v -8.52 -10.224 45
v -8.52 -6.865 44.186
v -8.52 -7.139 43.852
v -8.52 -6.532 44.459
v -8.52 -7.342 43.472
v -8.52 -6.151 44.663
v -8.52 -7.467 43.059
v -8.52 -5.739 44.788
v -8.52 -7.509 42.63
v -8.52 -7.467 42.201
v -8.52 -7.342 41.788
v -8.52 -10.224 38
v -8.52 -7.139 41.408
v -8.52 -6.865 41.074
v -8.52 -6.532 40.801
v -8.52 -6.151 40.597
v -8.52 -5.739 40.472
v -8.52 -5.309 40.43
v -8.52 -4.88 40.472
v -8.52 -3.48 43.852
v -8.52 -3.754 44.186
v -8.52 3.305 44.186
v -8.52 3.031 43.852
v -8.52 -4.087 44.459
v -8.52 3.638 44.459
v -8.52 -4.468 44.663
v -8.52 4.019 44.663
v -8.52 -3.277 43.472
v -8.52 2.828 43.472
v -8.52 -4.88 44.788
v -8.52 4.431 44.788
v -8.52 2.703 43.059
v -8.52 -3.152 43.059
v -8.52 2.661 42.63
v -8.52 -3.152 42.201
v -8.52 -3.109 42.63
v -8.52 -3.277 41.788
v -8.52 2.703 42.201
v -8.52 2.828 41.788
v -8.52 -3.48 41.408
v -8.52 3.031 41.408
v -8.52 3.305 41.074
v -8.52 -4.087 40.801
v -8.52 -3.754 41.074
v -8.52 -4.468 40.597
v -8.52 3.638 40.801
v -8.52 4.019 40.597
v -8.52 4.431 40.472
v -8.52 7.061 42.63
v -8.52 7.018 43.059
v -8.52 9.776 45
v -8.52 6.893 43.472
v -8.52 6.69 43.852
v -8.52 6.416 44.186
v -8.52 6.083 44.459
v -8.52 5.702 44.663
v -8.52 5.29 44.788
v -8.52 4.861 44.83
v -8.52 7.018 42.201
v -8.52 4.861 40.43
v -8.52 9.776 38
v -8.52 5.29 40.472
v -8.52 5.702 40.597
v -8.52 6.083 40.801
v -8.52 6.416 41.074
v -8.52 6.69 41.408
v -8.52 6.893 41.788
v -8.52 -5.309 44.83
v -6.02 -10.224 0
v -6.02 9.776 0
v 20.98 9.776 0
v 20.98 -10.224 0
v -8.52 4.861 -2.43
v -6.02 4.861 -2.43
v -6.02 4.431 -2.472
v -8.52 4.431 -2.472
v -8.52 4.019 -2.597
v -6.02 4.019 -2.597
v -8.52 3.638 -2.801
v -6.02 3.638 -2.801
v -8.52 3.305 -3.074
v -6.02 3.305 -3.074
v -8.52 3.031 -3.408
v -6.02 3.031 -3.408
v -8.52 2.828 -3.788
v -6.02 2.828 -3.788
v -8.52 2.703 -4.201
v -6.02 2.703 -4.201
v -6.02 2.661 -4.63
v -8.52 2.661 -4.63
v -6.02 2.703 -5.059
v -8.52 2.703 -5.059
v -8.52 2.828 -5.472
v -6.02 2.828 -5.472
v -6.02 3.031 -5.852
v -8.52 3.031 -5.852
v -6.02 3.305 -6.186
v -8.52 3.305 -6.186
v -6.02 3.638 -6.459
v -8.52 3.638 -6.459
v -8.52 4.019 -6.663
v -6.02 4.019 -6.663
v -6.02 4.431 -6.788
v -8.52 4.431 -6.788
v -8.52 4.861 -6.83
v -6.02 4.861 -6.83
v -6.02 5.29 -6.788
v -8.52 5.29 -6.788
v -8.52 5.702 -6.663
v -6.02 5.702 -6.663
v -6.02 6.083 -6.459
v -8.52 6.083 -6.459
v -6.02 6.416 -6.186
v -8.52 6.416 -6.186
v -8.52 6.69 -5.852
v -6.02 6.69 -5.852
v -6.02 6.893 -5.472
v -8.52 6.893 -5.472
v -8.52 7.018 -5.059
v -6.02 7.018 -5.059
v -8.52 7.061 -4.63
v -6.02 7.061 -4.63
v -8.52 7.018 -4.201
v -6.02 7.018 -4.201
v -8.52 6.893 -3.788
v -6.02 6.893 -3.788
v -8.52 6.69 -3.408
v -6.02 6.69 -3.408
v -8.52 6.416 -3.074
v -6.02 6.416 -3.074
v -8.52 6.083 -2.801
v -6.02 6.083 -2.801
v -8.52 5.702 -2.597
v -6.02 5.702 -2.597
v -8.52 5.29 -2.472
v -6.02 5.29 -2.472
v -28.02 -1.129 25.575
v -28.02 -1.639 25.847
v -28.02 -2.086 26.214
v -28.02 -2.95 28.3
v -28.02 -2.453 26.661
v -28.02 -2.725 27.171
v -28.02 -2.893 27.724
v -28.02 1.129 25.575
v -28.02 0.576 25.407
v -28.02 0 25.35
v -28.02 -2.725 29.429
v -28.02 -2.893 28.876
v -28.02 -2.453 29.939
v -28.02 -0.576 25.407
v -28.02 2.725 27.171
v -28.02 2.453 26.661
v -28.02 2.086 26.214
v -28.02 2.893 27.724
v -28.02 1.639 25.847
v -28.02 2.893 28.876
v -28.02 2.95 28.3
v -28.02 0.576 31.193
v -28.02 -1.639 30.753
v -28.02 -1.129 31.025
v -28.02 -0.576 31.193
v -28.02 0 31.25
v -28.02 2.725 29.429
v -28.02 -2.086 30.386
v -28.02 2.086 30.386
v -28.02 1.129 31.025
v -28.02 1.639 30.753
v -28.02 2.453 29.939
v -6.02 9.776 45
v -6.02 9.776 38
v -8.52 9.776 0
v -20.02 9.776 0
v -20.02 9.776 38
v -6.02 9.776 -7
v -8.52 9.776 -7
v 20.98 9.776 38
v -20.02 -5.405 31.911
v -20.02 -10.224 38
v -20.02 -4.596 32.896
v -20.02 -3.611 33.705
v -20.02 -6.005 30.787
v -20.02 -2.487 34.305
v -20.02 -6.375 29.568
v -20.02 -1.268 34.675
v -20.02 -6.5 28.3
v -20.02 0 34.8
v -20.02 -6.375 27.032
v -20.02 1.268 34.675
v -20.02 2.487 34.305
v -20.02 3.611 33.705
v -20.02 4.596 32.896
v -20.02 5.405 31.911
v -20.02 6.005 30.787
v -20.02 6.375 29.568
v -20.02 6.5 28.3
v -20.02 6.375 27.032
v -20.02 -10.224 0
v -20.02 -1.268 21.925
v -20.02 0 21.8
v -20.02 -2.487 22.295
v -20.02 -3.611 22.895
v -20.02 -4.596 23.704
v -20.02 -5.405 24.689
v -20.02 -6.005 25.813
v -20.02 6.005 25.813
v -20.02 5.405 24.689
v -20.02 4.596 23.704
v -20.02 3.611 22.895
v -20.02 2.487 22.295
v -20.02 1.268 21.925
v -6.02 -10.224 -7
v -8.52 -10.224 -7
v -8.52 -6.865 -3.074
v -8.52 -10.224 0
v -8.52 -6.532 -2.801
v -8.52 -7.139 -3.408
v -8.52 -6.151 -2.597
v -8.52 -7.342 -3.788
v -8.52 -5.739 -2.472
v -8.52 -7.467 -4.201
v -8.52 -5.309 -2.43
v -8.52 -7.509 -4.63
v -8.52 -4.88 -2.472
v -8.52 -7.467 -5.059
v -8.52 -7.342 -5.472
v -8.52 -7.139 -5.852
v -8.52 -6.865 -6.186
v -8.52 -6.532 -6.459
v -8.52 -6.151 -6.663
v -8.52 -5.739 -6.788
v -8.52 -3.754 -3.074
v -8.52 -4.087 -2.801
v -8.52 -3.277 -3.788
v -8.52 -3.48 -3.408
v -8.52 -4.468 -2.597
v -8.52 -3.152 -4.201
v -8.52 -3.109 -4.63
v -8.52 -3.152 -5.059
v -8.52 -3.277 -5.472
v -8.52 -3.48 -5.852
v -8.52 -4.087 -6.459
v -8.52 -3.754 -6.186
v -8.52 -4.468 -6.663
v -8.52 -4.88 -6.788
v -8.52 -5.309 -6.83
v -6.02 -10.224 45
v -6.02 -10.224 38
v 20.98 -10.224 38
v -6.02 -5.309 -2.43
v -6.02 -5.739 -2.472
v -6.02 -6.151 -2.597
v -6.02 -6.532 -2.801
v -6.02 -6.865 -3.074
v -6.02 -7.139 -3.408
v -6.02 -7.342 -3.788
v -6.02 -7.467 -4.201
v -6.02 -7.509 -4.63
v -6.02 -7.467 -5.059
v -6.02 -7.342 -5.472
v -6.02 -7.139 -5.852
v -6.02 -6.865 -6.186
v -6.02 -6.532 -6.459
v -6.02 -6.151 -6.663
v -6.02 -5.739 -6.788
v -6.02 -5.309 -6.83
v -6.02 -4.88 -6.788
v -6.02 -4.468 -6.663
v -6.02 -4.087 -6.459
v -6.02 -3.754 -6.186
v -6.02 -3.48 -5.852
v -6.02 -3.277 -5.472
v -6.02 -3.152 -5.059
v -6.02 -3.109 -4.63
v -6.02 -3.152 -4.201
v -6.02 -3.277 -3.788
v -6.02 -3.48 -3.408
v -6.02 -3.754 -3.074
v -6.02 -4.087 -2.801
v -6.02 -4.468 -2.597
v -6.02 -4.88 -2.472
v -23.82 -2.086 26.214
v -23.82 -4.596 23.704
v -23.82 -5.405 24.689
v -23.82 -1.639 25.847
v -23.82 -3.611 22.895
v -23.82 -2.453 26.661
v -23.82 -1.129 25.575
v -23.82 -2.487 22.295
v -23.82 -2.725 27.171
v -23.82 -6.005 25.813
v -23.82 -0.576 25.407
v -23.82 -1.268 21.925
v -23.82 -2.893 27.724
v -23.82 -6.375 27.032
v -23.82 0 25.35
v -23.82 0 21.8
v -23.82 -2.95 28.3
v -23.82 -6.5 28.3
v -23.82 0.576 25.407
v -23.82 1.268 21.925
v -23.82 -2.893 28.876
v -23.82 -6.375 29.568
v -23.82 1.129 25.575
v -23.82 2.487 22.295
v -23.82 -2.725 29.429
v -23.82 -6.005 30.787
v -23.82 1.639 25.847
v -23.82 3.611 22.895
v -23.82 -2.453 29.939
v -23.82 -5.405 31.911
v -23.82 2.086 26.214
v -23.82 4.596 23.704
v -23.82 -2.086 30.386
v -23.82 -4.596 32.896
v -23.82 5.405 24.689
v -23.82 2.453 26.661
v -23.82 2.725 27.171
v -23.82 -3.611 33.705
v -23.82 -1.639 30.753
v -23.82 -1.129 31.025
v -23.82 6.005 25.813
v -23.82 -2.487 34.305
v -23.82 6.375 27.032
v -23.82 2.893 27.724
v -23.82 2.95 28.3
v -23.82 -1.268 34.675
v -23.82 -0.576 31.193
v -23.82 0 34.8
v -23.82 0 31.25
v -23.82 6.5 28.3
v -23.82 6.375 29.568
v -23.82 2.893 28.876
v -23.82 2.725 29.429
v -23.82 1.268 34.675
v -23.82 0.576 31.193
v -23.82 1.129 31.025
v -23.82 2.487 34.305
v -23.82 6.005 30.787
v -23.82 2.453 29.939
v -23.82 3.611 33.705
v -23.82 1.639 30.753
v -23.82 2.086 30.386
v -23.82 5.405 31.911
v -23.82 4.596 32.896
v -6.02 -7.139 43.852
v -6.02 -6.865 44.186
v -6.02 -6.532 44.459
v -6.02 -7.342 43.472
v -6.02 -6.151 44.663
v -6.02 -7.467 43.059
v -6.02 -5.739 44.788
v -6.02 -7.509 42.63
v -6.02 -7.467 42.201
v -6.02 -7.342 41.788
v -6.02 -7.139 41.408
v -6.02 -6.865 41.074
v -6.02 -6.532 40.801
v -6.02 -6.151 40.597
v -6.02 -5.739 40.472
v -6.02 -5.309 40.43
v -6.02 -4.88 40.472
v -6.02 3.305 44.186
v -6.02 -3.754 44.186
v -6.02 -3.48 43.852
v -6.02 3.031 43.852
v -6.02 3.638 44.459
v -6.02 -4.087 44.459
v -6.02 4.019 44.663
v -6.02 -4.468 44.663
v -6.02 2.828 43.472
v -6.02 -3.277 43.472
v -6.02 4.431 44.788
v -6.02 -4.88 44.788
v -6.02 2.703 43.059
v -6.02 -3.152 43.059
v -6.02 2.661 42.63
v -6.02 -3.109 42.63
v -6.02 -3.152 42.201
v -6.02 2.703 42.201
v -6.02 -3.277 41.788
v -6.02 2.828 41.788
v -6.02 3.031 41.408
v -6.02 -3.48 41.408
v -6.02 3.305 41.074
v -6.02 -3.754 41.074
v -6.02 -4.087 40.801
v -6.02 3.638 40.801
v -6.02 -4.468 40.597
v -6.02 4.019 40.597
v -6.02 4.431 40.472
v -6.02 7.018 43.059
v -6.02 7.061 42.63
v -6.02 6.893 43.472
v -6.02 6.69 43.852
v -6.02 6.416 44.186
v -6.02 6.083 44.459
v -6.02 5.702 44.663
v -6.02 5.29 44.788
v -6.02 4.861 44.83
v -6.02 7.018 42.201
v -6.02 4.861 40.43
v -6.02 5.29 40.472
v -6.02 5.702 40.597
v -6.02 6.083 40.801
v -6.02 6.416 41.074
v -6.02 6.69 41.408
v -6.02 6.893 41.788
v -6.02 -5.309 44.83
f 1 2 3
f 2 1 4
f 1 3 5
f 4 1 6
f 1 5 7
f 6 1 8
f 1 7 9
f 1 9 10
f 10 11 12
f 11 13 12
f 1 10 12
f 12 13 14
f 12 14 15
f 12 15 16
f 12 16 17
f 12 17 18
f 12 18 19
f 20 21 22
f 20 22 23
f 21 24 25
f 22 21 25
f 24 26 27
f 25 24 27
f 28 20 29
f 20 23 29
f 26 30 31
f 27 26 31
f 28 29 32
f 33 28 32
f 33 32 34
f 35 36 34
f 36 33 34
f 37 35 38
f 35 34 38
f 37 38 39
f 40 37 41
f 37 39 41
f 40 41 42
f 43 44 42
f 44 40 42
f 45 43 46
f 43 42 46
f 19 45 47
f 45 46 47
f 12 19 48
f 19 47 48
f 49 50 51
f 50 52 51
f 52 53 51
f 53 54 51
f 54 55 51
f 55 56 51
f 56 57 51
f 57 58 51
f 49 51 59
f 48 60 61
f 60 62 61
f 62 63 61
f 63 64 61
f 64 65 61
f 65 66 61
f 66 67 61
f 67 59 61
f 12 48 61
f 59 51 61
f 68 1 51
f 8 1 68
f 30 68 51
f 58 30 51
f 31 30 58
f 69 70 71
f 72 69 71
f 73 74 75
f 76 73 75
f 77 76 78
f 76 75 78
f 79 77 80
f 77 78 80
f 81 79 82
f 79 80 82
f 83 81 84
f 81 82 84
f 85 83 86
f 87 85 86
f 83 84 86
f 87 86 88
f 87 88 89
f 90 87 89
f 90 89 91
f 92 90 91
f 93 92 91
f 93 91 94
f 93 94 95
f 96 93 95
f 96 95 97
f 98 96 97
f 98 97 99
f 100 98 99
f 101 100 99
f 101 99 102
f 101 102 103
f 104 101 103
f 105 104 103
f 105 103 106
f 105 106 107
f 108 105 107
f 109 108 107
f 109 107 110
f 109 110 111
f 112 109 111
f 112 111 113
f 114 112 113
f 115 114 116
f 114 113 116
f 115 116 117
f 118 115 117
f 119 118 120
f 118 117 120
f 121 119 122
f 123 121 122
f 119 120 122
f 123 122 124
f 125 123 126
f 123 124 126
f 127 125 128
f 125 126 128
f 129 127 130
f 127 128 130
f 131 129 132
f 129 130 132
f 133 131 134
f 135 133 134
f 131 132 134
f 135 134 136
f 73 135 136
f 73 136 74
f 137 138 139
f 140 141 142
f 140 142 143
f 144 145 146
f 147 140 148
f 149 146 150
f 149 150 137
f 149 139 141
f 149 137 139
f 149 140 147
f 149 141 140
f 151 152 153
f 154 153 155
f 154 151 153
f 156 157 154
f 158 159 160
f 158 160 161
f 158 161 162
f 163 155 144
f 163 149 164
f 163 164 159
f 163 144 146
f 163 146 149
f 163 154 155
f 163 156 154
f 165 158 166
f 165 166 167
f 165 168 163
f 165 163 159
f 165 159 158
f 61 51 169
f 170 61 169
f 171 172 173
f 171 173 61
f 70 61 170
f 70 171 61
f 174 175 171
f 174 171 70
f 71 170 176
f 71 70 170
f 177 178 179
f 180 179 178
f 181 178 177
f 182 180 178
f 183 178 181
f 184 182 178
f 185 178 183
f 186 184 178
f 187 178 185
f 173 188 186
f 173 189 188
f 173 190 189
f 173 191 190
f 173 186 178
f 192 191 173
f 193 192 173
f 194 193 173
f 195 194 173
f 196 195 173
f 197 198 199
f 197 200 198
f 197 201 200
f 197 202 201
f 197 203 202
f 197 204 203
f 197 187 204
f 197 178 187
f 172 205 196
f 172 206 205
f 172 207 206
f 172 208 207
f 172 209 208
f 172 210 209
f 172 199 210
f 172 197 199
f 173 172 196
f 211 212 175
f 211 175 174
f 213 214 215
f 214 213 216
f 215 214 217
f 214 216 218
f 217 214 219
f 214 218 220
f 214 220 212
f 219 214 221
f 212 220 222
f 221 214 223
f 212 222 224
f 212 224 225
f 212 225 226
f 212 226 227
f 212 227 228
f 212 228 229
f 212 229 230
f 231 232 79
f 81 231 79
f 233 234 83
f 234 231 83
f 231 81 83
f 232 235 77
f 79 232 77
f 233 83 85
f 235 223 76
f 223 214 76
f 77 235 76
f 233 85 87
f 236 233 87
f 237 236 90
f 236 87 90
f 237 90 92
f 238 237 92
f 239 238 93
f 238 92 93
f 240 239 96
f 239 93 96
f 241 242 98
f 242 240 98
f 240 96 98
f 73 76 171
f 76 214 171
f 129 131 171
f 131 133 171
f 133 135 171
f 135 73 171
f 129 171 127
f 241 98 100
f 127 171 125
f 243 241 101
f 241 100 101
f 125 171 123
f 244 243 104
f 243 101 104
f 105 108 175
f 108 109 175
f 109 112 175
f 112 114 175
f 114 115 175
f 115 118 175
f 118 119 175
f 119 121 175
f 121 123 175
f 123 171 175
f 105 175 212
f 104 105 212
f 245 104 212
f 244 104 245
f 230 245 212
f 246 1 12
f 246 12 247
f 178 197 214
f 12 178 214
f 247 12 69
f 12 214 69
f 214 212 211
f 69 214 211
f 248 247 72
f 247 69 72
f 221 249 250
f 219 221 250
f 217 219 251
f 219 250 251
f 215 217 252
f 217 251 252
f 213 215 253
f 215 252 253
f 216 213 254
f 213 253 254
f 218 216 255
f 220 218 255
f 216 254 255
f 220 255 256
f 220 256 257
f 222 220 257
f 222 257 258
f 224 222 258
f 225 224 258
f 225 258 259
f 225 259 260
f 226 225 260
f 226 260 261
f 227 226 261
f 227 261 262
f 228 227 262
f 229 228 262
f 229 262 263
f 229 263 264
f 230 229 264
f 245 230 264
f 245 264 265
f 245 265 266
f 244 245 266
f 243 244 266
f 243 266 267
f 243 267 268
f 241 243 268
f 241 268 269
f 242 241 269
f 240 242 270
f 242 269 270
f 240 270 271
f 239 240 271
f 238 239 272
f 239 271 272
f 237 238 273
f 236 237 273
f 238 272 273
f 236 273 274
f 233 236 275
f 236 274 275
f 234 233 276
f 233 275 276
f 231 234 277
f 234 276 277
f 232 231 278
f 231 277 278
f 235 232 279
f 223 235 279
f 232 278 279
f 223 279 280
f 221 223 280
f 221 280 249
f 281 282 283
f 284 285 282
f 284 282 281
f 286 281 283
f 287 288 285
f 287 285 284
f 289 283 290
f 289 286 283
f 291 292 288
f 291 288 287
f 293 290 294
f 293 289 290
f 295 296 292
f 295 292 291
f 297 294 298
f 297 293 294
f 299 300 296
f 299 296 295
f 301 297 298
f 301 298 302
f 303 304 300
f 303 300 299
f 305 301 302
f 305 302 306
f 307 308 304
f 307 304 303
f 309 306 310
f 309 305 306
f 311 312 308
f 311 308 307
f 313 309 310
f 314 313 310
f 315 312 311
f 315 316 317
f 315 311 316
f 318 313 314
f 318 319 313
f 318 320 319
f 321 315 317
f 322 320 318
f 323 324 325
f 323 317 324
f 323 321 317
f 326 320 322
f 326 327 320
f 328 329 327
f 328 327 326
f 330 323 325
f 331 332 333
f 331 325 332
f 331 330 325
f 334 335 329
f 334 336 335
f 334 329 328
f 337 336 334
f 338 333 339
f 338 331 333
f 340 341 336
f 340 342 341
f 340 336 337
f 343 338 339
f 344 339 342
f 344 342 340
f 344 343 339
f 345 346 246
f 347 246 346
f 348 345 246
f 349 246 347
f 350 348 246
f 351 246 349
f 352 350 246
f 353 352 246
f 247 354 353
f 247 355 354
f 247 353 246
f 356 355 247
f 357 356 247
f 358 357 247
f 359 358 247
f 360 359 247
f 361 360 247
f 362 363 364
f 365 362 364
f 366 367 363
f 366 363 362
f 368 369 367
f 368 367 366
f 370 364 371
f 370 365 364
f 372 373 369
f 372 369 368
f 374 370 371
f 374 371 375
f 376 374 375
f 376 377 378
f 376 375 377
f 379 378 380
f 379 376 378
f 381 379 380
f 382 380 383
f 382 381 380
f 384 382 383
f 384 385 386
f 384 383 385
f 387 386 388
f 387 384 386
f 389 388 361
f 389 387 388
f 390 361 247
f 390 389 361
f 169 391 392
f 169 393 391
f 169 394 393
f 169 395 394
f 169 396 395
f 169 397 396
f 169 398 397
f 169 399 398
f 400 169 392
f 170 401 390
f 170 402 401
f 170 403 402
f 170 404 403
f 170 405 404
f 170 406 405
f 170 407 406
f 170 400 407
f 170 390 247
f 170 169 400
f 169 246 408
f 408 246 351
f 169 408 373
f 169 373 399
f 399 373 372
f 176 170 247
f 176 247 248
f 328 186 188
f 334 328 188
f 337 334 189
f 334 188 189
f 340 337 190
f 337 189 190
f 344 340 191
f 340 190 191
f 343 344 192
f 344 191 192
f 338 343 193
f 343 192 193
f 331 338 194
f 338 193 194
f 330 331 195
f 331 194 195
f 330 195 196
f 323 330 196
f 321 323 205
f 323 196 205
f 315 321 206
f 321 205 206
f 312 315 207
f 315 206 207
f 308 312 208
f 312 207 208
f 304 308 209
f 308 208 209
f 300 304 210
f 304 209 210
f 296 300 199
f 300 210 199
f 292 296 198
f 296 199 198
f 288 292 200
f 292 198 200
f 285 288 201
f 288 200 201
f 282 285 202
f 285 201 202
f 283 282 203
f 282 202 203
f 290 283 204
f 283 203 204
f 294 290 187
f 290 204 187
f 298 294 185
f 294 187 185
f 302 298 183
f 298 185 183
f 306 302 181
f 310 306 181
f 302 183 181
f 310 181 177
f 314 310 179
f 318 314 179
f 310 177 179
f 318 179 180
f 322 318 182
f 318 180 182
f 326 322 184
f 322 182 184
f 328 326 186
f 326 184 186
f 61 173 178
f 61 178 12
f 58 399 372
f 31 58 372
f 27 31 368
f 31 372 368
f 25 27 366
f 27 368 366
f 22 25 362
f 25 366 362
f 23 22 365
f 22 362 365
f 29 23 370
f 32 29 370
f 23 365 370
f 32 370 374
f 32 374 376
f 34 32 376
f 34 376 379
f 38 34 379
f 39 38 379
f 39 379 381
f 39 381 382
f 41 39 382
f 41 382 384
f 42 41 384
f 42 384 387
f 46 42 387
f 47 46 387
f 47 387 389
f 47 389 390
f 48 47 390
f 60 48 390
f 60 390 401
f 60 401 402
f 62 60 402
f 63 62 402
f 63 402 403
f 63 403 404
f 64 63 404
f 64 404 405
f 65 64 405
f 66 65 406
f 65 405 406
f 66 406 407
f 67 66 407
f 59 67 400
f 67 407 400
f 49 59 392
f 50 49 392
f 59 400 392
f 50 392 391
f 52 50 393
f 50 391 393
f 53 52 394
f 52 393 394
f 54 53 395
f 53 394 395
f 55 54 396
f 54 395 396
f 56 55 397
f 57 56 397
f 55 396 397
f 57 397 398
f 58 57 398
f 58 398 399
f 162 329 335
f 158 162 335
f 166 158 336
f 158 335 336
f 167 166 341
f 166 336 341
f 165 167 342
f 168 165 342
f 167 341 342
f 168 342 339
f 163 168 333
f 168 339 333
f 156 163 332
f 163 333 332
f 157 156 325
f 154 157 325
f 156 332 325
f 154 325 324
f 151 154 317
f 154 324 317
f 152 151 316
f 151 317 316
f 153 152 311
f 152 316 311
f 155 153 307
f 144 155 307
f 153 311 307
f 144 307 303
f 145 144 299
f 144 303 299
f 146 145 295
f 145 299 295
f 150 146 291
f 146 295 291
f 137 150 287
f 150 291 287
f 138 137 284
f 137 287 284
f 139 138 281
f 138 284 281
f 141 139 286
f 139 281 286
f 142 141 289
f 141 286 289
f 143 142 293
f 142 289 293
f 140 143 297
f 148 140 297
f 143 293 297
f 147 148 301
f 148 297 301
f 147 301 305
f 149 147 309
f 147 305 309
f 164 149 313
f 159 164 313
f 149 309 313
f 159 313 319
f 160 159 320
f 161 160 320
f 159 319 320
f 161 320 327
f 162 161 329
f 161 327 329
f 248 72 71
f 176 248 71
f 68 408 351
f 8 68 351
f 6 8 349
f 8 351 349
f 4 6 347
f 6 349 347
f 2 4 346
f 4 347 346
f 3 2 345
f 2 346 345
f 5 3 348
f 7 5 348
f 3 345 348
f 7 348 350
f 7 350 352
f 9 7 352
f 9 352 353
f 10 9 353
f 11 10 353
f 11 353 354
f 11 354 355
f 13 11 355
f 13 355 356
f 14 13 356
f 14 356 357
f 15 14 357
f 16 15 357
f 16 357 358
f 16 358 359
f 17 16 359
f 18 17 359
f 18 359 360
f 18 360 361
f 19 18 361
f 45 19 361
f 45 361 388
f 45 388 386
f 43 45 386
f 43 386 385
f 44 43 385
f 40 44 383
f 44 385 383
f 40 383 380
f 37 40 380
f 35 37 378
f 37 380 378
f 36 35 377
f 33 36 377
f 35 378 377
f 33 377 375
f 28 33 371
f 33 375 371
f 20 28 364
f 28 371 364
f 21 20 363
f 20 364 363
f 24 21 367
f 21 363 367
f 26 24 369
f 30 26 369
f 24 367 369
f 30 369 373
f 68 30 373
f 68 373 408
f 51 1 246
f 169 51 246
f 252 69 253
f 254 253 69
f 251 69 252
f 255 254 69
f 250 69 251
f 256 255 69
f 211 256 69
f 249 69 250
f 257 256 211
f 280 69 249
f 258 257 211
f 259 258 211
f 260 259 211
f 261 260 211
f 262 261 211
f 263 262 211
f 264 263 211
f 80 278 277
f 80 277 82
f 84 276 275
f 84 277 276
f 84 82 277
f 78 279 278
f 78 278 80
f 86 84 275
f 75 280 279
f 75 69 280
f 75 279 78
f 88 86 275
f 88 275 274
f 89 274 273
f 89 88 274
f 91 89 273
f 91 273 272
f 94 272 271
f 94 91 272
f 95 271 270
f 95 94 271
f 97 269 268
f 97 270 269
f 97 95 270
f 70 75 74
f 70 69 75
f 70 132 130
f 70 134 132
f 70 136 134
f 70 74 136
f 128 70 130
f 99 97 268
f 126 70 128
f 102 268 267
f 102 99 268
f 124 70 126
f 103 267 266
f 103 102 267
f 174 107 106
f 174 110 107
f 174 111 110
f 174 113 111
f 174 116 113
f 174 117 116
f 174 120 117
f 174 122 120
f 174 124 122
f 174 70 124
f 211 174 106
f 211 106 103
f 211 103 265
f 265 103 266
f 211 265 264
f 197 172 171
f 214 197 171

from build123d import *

# Parameters (mm, degrees)
SKETCH1_W                      = 41
SKETCH1_H                      = 20
EXTRUDE1_DEPTH                 = 38
SKETCH2_W                      = 2.5
SKETCH2_H                      = 52
EXTRUDE2_DEPTH                 = 20
SKETCH3_R                      = 6.5
EXTRUDE3_DEPTH                 = 3.8
SKETCH4_R                      = 2.95
EXTRUDE4_DEPTH                 = 4.2
F_4_4_4_4_DIAMETER_HOLE1_D     = 4.4
F_4_4_4_4_DIAMETER_HOLE1_DEPTH = 150
F_4_4_4_4_DIAMETER_HOLE1_TIP   = 1.321893362


with BuildPart() as part:
    # Sketch1 → Extrude1 (new body)
    with BuildSketch(Plane.XY):
        with Locations((0.479801018, -0.224419429)):
            Rectangle(SKETCH1_W, SKETCH1_H)
    extrude(amount=EXTRUDE1_DEPTH)

    # Sketch2 → Extrude2 (add)
    with BuildSketch(Plane(origin=(0, 9.775580571, 0), x_dir=(1, 0, 0), z_dir=(0, 1, 0))):
        with Locations((-7.270198982, -19)):
            Rectangle(SKETCH2_W, SKETCH2_H)
    extrude(amount=-EXTRUDE2_DEPTH)

    # Sketch3 → Extrude3 (add)
    with BuildSketch(Plane.ZY.offset(20.020198982)):
        with Locations((28.3, 0)):
            Circle(SKETCH3_R)
    extrude(amount=EXTRUDE3_DEPTH)

    # Sketch4 → Extrude4 (add)
    with BuildSketch(Plane.ZY.offset(23.820198982)):
        with Locations((28.3, 0)):
            Circle(SKETCH4_R)
    extrude(amount=EXTRUDE4_DEPTH)

    # Ø4.4 (4.4) Diameter Hole1
    with Locations(Plane(origin=(-8.520198982, 4.860580571, -4.63), x_dir=(0, 0, -1), z_dir=(-1, 0, 0))):
        with Locations((0, 0), (0, 10.17), (-47.26, 0), (-47.26, 10.17)):
            Hole(F_4_4_4_4_DIAMETER_HOLE1_D / 2, depth=F_4_4_4_4_DIAMETER_HOLE1_DEPTH)
            with Locations((0, 0, -(F_4_4_4_4_DIAMETER_HOLE1_DEPTH + F_4_4_4_4_DIAMETER_HOLE1_TIP / 2))):  # 118° drill point
                Cone(0, F_4_4_4_4_DIAMETER_HOLE1_D / 2, F_4_4_4_4_DIAMETER_HOLE1_TIP, mode=Mode.SUBTRACT)


solid = part.part
